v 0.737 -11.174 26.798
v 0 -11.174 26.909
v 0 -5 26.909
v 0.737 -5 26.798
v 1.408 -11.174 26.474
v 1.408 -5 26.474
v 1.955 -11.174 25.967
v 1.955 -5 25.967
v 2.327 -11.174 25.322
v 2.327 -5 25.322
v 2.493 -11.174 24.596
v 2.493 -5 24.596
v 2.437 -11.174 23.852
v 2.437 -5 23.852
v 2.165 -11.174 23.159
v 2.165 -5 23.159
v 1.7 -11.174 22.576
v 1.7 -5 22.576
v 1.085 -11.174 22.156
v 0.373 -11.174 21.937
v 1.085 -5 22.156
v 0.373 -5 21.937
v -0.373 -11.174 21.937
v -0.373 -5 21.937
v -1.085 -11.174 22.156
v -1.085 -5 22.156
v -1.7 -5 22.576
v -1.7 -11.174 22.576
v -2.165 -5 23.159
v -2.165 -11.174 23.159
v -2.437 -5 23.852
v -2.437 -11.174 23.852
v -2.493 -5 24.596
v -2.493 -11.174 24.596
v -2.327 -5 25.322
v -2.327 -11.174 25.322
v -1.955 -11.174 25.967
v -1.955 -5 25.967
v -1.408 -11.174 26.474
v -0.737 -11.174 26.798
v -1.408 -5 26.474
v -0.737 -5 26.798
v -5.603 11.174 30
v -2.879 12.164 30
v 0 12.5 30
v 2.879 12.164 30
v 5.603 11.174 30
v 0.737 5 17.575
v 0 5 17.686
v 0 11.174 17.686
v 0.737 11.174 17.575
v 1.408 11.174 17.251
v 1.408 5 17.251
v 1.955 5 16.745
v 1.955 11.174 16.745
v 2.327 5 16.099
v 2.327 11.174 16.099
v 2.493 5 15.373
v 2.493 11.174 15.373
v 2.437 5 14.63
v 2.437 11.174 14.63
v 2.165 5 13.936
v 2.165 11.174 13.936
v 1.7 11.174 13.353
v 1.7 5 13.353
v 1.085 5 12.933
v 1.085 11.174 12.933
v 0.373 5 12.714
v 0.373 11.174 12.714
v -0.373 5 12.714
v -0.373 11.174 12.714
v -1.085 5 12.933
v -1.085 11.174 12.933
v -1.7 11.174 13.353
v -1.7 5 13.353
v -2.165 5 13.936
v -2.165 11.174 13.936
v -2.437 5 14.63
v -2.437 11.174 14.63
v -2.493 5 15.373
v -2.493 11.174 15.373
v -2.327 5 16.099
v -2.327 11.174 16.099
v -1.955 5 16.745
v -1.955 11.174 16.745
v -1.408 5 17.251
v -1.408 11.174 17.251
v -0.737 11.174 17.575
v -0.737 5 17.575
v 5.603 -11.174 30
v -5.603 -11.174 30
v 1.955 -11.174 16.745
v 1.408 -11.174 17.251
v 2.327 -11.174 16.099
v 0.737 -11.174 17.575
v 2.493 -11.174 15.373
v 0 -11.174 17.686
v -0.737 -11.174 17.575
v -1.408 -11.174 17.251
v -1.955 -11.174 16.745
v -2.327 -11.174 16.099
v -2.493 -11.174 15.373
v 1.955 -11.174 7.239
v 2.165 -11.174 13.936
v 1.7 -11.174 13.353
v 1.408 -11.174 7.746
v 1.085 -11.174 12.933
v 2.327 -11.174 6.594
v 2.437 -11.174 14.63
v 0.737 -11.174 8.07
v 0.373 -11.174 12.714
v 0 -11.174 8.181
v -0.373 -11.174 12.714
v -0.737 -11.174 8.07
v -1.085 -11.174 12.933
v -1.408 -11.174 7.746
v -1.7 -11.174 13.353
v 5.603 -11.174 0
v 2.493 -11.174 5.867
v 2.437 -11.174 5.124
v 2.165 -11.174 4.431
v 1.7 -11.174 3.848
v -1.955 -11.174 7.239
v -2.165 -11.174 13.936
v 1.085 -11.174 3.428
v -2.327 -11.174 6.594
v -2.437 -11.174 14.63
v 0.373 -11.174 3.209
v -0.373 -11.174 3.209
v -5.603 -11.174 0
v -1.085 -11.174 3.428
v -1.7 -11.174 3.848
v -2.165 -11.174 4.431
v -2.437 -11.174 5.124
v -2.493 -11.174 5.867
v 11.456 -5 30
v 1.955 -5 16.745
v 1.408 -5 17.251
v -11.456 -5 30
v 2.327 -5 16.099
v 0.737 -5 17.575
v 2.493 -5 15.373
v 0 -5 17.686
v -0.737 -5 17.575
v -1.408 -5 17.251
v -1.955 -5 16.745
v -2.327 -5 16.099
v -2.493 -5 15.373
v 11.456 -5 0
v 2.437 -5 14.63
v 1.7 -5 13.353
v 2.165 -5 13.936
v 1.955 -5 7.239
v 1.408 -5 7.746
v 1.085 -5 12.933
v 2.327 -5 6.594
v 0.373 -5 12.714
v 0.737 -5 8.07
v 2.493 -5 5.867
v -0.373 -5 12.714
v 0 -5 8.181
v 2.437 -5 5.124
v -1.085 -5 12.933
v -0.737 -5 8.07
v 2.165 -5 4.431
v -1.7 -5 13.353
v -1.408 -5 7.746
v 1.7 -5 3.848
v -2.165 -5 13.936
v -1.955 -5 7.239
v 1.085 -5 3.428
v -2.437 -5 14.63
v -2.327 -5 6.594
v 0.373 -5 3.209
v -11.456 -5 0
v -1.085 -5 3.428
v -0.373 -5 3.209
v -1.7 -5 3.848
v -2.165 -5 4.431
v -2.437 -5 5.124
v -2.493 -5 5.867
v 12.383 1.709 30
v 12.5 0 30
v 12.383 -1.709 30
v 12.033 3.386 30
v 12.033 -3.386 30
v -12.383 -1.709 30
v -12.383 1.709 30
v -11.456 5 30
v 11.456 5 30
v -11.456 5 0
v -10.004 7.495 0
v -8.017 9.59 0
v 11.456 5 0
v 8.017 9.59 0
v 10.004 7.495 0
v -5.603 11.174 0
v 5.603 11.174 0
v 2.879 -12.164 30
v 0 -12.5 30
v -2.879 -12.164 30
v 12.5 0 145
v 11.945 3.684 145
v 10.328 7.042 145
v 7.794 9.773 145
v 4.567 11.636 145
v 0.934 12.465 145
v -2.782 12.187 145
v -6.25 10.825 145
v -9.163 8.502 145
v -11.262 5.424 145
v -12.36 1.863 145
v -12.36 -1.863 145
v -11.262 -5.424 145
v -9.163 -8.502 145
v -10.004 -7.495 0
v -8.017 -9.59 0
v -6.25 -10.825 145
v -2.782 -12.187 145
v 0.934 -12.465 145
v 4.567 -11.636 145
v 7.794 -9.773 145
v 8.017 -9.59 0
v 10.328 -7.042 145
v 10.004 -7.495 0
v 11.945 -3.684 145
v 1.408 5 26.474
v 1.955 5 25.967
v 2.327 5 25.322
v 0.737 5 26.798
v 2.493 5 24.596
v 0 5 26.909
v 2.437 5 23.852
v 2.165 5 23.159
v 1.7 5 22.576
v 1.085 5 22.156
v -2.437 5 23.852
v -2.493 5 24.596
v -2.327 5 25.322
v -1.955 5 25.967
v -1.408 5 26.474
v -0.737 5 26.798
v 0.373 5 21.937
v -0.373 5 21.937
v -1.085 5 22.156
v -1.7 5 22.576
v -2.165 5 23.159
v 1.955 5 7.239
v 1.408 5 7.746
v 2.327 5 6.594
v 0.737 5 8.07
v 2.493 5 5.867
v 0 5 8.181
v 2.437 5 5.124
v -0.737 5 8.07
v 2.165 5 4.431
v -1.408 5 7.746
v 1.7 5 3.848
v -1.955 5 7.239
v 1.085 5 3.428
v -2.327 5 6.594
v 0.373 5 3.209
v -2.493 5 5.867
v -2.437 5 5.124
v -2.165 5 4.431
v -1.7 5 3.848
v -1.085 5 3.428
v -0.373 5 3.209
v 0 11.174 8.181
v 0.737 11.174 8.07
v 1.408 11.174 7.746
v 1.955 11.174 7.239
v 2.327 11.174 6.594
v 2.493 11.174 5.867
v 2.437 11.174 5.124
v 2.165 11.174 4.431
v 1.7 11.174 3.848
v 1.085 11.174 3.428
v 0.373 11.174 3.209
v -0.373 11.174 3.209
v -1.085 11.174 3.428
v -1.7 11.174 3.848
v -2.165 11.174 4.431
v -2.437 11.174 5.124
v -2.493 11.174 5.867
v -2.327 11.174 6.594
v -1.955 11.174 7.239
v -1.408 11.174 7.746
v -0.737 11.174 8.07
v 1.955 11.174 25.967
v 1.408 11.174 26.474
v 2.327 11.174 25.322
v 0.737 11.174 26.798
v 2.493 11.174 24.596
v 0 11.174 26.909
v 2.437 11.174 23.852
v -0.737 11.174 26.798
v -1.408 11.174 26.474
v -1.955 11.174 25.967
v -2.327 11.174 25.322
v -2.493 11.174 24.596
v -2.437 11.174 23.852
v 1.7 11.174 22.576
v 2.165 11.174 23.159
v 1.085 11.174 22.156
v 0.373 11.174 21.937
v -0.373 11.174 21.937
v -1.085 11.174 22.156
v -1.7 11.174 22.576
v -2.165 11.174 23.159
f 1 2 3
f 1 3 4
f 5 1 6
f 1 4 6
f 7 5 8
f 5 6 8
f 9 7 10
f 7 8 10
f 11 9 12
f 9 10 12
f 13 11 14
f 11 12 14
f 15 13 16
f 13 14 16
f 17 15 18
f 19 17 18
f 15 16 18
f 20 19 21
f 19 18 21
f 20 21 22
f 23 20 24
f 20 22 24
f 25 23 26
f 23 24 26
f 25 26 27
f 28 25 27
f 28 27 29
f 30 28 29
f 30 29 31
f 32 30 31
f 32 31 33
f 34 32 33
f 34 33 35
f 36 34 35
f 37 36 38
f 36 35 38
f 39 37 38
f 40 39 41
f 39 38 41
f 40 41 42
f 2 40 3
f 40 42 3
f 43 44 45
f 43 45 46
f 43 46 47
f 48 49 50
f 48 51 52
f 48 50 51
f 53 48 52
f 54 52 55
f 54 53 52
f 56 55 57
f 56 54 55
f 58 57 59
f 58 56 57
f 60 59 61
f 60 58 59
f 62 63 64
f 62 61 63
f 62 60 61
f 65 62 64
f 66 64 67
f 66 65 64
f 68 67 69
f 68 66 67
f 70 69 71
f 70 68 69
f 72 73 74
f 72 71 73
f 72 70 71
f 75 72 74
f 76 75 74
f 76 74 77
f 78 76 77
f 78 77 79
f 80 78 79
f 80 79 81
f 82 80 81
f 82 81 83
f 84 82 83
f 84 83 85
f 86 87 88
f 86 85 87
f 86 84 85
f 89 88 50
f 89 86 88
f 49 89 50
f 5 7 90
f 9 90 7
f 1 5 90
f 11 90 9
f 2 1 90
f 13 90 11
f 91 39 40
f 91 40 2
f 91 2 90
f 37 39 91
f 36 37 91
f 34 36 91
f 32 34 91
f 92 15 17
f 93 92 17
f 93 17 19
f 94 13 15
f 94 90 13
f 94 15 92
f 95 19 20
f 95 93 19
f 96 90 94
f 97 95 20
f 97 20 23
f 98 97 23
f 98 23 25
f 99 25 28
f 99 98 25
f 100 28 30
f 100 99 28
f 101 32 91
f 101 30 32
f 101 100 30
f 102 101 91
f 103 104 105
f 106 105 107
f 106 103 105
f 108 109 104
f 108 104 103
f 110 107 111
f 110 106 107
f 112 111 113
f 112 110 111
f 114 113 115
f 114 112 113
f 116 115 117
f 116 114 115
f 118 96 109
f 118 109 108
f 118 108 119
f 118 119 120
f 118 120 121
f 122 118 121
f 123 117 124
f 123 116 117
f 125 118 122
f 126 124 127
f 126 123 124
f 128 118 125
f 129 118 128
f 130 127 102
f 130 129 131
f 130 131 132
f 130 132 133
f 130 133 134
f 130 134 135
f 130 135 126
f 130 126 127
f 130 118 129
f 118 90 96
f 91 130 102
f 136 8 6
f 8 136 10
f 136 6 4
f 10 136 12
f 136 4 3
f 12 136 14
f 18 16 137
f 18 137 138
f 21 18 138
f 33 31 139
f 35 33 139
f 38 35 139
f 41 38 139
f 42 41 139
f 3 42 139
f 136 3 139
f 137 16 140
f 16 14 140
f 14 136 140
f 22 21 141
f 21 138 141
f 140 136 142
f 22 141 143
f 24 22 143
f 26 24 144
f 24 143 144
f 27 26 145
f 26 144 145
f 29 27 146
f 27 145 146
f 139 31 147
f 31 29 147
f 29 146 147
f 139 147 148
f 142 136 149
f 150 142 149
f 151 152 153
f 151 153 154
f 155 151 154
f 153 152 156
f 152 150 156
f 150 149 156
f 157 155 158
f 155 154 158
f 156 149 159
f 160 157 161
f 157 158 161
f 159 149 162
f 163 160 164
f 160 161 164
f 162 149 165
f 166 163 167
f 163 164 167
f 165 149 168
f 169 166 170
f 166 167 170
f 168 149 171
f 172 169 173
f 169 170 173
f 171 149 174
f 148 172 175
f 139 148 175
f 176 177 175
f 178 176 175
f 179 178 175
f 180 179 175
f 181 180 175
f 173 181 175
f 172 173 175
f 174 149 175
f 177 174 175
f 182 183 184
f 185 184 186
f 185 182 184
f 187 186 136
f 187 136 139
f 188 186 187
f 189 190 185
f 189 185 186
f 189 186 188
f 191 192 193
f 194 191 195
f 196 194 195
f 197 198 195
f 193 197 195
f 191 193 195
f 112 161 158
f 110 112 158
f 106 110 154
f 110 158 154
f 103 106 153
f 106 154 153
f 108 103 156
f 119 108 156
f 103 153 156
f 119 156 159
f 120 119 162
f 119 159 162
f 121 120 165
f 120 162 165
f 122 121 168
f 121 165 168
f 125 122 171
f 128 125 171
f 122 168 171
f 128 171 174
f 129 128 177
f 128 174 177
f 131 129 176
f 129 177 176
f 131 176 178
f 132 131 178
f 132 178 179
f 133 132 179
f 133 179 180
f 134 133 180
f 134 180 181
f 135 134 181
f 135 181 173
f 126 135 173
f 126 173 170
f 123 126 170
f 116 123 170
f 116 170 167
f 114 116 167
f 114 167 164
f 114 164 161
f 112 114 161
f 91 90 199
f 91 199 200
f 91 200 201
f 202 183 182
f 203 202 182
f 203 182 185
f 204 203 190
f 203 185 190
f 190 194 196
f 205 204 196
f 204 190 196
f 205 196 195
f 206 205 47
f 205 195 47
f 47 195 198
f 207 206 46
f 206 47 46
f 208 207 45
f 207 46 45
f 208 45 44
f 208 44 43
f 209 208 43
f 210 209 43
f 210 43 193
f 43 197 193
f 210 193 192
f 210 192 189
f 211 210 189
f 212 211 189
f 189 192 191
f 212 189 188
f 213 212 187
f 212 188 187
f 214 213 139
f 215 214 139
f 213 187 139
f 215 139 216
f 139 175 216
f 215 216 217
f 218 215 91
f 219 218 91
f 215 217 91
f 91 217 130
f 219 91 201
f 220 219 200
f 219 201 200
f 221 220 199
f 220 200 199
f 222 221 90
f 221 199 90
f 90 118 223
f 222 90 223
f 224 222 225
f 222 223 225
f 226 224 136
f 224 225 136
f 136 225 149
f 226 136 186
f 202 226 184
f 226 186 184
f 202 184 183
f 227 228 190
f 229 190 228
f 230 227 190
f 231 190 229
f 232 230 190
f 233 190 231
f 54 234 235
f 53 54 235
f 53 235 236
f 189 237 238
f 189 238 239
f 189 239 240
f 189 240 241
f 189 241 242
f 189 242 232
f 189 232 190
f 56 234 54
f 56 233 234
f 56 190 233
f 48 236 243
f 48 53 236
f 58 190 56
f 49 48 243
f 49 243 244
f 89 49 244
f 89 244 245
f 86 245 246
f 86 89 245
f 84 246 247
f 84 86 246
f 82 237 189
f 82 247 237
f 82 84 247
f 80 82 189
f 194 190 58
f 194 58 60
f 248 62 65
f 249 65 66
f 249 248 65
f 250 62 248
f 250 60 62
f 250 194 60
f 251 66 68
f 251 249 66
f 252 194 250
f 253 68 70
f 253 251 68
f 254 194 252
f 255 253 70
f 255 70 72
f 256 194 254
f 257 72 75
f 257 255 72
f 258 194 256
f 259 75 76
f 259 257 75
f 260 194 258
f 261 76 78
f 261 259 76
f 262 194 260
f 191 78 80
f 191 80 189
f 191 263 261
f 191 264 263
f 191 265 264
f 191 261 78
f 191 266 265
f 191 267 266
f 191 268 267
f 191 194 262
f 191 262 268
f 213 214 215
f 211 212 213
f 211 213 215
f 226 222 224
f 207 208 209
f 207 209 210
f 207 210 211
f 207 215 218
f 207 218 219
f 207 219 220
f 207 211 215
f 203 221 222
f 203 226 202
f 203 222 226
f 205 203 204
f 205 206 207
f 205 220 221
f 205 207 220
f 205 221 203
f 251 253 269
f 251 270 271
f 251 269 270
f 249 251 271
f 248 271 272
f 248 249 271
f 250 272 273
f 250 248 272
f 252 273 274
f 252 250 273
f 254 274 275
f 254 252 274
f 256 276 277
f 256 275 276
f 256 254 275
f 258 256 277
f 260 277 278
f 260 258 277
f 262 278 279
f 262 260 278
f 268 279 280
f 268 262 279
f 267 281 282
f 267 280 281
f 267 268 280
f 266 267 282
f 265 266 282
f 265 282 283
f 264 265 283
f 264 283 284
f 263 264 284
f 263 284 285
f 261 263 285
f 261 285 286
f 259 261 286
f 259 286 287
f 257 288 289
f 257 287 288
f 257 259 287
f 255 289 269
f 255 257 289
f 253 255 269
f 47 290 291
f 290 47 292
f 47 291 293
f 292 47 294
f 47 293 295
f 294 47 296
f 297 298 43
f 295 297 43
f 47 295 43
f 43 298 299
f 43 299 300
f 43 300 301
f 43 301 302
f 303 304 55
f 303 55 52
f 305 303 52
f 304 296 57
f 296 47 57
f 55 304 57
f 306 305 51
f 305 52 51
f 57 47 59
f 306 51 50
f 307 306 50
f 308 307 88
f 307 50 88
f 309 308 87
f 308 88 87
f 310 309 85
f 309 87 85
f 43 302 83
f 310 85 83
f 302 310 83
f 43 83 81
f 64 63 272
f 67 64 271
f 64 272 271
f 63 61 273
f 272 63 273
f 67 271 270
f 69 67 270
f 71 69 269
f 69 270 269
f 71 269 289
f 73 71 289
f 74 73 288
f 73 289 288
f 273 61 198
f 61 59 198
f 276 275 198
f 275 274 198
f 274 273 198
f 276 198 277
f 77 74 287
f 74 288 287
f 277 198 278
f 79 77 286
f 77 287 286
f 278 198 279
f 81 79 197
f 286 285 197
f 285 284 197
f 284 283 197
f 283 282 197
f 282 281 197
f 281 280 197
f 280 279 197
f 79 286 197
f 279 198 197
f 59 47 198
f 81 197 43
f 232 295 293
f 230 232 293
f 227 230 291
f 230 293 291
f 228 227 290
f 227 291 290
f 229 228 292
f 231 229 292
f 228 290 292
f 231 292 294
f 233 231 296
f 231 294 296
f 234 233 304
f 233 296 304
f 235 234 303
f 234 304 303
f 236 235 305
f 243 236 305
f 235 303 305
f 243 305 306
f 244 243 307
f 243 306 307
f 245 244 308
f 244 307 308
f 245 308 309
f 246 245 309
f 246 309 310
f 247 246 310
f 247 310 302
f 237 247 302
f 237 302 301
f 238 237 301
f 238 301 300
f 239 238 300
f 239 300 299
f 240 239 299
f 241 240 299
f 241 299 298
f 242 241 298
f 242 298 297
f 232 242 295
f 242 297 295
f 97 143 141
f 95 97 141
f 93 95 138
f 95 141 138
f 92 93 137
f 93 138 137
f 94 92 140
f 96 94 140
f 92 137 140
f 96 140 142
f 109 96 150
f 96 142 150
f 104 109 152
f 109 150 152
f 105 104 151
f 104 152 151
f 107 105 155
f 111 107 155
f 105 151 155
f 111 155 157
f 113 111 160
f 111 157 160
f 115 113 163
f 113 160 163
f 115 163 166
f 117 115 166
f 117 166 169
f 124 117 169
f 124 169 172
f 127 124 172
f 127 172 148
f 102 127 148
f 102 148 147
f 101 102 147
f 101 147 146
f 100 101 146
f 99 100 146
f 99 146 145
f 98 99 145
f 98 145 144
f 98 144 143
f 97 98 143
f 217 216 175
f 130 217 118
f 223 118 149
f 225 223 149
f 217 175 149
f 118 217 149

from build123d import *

# Parameters (mm, degrees)
SKETCH_1_R          = 12.5
EXTRUDE_1_DEPTH     = 145
SKETCH_2_W          = 70.200911856
SKETCH_2_H          = 10
CUT_EXTRUDE_2_DEPTH = 30
SKETCH_4_R          = 2.5
CUT_EXTRUDE_1_DEPTH = 35
SKETCH_5_W          = 33.79642712
SKETCH_5_H          = 6.499312907
CUT_EXTRUDE_4_DEPTH = 30


with BuildPart() as part:
    # Эскиз1 → Вытянуть1 (new body)
    with BuildSketch(Plane.XY):
        Circle(SKETCH_1_R)
    extrude(amount=EXTRUDE_1_DEPTH)

    # Эскиз2 → Вытянуть2 (cut)
    with BuildSketch(Plane(origin=(0, 0, 0), x_dir=(-1, 0, 0), z_dir=(0, 0, -1))):
        Rectangle(SKETCH_2_W, SKETCH_2_H)
    extrude(amount=-CUT_EXTRUDE_2_DEPTH, mode=Mode.SUBTRACT)

    # Эскиз4 → Вырез-Вытянуть1 (cut, symmetric)
    with BuildSketch(Plane(origin=(0, 0, 0), x_dir=(1, 0, 0), z_dir=(0, 1, 0))):
        with Locations(Location((0, -5.680597097, 0), (0, 0, 270))):
            Circle(SKETCH_4_R)
        with Locations(Location((0, -15.185844734, 0), (0, 0, 270))):
            Circle(SKETCH_4_R)
        with Locations(Location((0, -24.408758256, 0), (0, 0, 270))):
            Circle(SKETCH_4_R)
    extrude(amount=CUT_EXTRUDE_1_DEPTH, both=True, mode=Mode.SUBTRACT)

    # Эскиз5 → Вытянуть4 (cut)
    with BuildSketch(Plane(origin=(0, 0, 0), x_dir=(-1, 0, 0), z_dir=(0, 0, -1))):
        with Locations((0.724923363, -14.423475184)):
            Rectangle(SKETCH_5_W, SKETCH_5_H)
        with Locations((0.724923363, 14.423475184)):
            Rectangle(SKETCH_5_W, SKETCH_5_H)
    extrude(amount=-CUT_EXTRUDE_4_DEPTH, mode=Mode.SUBTRACT)


solid = part.part
